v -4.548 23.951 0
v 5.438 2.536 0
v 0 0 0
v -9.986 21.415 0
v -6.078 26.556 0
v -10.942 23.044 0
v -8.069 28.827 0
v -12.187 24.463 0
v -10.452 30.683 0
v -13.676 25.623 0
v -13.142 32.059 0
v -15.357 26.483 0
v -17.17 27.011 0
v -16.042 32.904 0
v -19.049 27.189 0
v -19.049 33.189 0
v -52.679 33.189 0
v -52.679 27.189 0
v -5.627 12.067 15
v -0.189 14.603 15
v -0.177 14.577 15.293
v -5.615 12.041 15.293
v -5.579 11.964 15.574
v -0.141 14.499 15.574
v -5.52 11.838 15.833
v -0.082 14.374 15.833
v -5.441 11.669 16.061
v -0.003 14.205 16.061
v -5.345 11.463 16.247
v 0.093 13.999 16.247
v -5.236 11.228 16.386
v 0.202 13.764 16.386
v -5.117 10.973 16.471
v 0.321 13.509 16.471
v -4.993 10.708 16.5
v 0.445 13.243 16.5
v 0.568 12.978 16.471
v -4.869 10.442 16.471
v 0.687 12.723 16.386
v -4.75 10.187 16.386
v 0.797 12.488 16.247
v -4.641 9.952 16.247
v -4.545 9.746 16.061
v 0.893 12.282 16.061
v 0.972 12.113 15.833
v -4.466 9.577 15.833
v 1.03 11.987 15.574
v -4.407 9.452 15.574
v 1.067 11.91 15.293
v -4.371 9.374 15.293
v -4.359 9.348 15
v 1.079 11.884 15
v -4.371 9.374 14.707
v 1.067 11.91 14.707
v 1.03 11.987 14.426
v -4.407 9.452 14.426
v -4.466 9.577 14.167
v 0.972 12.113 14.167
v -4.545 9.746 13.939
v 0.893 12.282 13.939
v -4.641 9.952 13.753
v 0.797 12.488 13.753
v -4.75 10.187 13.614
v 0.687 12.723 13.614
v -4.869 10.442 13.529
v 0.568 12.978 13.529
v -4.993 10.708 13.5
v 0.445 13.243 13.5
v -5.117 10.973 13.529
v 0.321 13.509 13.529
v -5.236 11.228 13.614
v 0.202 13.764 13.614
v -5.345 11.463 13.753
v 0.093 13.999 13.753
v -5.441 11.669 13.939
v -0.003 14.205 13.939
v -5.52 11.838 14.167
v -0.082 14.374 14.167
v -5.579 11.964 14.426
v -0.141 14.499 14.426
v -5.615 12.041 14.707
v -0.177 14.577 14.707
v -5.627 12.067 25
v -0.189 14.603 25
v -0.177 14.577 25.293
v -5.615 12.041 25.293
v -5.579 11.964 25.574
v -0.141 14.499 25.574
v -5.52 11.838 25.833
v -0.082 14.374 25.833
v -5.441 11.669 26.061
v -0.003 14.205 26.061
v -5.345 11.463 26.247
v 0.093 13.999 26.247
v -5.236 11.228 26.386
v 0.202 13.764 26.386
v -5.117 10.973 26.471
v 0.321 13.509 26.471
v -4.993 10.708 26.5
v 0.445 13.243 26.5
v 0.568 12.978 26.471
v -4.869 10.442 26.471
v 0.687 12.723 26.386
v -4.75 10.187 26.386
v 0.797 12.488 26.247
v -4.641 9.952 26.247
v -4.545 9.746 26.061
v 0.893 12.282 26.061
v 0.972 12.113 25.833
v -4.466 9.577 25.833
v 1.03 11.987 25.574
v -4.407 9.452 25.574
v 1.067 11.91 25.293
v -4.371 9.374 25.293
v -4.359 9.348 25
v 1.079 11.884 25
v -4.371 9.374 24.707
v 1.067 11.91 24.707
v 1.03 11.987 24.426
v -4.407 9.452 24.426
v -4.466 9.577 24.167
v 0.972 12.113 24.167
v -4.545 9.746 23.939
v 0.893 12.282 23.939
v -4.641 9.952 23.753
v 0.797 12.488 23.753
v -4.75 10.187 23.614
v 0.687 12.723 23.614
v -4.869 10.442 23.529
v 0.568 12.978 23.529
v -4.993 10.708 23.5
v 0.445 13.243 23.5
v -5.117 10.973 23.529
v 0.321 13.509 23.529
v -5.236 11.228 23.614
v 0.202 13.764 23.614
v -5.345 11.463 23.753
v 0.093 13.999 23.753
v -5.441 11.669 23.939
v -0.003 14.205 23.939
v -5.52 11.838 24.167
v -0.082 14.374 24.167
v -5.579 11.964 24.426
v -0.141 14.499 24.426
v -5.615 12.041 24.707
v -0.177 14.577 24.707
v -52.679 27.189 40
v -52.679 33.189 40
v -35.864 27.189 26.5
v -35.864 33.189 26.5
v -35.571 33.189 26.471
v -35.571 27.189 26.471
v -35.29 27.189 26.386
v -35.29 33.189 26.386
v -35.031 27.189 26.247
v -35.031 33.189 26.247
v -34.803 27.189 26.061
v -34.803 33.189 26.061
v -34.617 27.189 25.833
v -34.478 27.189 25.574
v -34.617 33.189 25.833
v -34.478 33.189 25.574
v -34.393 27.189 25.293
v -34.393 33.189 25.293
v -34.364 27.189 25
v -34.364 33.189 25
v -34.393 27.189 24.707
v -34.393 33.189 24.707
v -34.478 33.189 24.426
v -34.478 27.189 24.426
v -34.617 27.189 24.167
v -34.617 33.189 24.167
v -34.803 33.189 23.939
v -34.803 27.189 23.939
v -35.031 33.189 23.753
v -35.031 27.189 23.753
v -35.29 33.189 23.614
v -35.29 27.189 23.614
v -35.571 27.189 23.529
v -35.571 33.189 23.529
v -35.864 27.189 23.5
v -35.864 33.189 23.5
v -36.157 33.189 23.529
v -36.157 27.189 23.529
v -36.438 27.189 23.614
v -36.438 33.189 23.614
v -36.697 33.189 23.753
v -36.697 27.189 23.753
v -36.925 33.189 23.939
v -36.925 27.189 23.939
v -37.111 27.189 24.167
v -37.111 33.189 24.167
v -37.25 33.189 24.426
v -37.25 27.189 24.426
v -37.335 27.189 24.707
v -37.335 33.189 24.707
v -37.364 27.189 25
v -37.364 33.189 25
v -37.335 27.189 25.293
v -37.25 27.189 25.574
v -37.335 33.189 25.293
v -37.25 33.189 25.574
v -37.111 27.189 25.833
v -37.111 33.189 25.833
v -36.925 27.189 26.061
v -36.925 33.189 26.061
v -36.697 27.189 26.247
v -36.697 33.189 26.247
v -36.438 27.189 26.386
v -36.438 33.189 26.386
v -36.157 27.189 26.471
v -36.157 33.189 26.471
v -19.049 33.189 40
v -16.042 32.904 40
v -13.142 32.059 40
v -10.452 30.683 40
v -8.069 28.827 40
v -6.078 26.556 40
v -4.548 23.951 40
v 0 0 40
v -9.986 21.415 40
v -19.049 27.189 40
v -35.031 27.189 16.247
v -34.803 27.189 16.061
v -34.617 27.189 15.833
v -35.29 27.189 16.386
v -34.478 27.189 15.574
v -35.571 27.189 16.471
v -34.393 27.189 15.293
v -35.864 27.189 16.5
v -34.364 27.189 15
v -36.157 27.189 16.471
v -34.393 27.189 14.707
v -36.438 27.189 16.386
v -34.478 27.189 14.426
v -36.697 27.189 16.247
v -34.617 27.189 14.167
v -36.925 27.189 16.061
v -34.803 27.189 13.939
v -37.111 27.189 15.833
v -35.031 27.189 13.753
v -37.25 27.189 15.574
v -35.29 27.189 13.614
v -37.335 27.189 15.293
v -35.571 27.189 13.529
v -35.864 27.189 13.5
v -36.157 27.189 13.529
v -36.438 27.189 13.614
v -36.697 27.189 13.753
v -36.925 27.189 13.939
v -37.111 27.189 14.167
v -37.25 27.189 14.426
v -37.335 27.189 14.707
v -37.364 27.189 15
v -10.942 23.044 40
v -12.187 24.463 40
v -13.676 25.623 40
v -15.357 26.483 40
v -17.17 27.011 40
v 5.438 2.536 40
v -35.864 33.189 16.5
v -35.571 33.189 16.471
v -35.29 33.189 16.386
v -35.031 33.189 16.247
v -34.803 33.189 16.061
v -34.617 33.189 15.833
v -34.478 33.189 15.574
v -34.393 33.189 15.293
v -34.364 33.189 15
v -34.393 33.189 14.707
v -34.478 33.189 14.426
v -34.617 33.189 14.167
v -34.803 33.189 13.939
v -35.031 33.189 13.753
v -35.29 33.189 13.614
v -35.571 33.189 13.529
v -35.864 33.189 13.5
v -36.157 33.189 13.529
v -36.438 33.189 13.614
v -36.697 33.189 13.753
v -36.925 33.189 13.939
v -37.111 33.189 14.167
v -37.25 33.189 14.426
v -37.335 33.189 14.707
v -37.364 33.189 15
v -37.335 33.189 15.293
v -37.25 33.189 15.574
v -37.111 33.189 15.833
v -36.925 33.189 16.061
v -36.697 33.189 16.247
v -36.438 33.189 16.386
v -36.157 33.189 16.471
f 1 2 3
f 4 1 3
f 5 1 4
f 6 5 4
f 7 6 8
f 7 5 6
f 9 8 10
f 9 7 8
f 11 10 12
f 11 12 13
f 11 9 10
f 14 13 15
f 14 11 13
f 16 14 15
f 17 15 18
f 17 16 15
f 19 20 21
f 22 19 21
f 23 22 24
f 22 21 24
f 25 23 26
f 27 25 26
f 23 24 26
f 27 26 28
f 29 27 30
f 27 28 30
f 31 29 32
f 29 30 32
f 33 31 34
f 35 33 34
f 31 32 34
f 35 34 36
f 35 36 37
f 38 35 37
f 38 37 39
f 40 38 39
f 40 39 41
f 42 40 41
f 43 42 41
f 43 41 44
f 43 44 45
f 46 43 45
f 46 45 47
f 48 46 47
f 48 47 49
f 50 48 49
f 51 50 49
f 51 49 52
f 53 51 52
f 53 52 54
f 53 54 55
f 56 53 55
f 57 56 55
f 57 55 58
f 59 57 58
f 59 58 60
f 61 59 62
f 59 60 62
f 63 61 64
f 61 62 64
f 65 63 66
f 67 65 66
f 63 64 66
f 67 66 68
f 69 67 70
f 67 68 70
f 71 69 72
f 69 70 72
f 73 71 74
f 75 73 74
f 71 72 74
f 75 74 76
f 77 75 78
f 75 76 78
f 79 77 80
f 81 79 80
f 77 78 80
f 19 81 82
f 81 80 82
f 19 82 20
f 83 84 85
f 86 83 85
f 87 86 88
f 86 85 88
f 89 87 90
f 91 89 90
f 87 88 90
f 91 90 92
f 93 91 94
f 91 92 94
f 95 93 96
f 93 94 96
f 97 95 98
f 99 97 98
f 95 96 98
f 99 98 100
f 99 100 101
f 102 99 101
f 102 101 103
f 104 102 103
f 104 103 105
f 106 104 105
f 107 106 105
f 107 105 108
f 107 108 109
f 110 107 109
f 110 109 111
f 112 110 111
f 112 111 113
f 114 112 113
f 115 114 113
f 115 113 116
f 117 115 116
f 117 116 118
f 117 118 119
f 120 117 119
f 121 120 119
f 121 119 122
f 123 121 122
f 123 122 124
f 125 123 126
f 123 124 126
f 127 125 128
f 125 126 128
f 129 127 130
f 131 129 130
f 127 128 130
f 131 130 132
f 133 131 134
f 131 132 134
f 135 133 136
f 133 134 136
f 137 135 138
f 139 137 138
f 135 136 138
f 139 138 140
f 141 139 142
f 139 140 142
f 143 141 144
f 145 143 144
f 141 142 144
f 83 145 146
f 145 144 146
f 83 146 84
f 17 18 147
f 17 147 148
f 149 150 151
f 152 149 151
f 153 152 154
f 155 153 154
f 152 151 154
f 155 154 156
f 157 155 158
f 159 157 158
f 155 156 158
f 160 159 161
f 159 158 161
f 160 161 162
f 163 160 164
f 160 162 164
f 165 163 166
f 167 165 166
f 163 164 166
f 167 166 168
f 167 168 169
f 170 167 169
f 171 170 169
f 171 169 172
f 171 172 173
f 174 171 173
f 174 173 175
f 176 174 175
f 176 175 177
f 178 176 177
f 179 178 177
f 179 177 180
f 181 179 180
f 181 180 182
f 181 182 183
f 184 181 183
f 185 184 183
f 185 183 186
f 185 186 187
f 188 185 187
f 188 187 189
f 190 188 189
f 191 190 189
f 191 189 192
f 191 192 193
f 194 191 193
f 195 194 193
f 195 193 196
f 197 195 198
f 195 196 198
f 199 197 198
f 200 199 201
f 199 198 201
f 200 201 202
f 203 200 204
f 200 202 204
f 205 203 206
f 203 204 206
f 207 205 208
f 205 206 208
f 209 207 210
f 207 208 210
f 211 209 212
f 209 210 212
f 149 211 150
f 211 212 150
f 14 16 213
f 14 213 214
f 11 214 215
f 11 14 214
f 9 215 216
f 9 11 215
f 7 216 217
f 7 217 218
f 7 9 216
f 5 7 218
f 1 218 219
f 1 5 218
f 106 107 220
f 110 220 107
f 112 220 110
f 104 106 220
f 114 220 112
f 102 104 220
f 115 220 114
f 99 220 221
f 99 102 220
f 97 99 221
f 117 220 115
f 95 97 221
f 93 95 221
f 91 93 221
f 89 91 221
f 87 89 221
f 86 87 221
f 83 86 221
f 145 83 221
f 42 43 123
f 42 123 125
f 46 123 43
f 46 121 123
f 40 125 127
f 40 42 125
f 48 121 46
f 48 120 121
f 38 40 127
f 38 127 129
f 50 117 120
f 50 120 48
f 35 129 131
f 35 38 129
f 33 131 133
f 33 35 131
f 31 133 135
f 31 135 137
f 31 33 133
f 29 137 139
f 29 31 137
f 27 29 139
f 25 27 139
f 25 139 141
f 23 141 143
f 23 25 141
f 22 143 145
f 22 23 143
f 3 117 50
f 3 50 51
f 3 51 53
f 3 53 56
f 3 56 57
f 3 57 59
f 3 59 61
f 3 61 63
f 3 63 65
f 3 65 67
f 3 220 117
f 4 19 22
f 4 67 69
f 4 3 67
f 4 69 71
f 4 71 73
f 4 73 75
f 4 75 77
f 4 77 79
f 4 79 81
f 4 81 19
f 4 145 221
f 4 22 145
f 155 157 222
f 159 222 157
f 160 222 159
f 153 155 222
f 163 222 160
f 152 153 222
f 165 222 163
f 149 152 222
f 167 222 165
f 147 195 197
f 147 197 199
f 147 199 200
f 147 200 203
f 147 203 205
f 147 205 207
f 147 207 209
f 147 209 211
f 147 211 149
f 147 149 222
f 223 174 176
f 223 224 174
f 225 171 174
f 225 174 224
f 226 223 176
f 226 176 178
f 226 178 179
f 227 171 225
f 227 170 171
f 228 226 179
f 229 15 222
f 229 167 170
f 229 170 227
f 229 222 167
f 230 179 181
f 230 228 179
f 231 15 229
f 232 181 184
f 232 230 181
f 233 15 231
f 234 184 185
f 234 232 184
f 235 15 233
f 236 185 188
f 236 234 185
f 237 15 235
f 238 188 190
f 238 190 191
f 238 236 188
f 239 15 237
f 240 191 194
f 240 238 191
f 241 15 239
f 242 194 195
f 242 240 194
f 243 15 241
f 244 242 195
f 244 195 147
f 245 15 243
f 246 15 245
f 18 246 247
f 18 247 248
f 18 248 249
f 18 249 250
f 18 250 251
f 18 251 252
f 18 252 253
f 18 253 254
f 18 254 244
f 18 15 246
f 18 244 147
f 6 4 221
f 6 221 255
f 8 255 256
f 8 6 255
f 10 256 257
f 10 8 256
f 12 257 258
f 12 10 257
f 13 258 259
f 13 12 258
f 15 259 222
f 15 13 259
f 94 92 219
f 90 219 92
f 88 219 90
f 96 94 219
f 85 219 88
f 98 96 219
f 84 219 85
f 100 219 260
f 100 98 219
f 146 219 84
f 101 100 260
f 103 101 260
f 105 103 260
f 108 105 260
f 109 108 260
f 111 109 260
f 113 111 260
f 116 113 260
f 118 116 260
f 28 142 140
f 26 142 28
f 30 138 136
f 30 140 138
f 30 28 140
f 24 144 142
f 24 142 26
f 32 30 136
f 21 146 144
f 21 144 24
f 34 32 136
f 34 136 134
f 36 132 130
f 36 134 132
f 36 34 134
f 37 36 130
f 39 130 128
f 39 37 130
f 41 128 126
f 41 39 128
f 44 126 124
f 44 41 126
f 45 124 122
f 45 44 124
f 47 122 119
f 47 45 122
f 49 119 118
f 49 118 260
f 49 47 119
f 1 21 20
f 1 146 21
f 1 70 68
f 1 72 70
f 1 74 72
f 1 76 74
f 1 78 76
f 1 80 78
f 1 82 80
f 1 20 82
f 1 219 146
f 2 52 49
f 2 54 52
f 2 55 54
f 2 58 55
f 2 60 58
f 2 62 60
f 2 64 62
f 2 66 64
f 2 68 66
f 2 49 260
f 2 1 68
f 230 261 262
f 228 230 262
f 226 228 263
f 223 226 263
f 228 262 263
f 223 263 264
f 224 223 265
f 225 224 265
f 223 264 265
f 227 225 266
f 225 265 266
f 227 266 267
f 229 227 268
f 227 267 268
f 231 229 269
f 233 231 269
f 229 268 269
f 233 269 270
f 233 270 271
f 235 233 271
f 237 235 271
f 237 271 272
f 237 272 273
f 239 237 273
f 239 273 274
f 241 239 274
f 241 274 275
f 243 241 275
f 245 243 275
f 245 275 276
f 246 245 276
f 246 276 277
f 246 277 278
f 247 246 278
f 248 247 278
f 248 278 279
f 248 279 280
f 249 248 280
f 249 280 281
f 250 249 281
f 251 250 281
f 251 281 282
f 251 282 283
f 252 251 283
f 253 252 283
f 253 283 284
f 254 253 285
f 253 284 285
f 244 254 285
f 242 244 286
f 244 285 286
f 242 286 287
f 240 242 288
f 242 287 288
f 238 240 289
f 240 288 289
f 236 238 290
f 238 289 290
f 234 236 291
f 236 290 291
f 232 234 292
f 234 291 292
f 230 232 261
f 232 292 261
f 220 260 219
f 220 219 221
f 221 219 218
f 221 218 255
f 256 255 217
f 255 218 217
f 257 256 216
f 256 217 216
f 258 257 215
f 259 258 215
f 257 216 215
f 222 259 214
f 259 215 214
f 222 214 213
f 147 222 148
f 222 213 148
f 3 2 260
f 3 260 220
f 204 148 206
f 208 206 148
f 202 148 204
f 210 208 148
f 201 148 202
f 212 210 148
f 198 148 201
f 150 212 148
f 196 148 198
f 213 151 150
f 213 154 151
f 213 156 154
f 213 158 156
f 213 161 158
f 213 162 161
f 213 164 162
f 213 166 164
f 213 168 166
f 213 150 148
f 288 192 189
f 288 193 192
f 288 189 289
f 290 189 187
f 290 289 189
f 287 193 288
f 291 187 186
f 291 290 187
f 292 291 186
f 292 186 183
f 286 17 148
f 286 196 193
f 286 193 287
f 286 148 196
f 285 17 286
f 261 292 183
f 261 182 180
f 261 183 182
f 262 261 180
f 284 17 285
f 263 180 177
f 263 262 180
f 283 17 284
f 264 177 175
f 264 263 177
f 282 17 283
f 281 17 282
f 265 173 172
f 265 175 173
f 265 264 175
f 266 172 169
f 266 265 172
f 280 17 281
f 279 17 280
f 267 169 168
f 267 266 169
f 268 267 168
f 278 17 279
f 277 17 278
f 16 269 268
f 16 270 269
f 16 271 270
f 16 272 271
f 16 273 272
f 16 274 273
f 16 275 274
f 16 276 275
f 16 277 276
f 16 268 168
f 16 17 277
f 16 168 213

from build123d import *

# Parameters (mm, degrees)
BOSS_EXTRUDE1_DEPTH = 40
SKETCH2_R           = 1.5
CUT_EXTRUDE1_DEPTH  = 40
SKETCH3_R           = 1.5
CUT_EXTRUDE2_DEPTH  = 40


with BuildPart() as part:
    # Sketch1 → Boss-Extrude1 (new body)
    with BuildSketch(Plane.XY):
        with BuildLine():
            Line((0, 0), (-9.98617259, 21.415416229))
            ThreePointArc((-9.98617259, 21.415416229), (-13.676254377, 25.623148069), (-19.04925046, 27.189233611))
            Line((-19.04925046, 27.189233611), (-52.678547852, 27.189233611))
            Line((-52.678547852, 27.189233611), (-52.678547852, 33.189233611))
            Line((-52.678547852, 33.189233611), (-19.04925046, 33.189233611))
            ThreePointArc((-19.04925046, 33.189233611), (-10.452456727, 30.683496744), (-4.548325868, 23.951125799))
            Line((-4.548325868, 23.951125799), (5.437846722, 2.53570957))
            Line((5.437846722, 2.53570957), (0, 0))
        make_face()
    extrude(amount=BOSS_EXTRUDE1_DEPTH)

    # Sketch2 → Cut-Extrude1 (cut)
    with BuildSketch(Plane(origin=(0, 33.189233611, 0), x_dir=(1, 0, 0), z_dir=(0, 1, 0))):
        with Locations(Location((-35.863899156, -15, 0), (0, 0, 270))):
            Circle(SKETCH2_R)
        with Locations(Location((-35.863899156, -25, 0), (0, 0, 270))):
            Circle(SKETCH2_R)
    extrude(amount=-CUT_EXTRUDE1_DEPTH, mode=Mode.SUBTRACT)

    # Sketch3 → Cut-Extrude2 (cut)
    with BuildSketch(Plane(origin=(5.437846722, 2.53570957, 0), x_dir=(0, 0, -1), z_dir=(0.906307787036651, 0.42261826174069705, 0))):
        with Locations(Location((-15, 11.814648696, 0), (0, 0, 90))):
            Circle(SKETCH3_R)
        with Locations(Location((-25, 11.814648696, 0), (0, 0, 90))):
            Circle(SKETCH3_R)
    extrude(amount=-CUT_EXTRUDE2_DEPTH, mode=Mode.SUBTRACT)


solid = part.part
